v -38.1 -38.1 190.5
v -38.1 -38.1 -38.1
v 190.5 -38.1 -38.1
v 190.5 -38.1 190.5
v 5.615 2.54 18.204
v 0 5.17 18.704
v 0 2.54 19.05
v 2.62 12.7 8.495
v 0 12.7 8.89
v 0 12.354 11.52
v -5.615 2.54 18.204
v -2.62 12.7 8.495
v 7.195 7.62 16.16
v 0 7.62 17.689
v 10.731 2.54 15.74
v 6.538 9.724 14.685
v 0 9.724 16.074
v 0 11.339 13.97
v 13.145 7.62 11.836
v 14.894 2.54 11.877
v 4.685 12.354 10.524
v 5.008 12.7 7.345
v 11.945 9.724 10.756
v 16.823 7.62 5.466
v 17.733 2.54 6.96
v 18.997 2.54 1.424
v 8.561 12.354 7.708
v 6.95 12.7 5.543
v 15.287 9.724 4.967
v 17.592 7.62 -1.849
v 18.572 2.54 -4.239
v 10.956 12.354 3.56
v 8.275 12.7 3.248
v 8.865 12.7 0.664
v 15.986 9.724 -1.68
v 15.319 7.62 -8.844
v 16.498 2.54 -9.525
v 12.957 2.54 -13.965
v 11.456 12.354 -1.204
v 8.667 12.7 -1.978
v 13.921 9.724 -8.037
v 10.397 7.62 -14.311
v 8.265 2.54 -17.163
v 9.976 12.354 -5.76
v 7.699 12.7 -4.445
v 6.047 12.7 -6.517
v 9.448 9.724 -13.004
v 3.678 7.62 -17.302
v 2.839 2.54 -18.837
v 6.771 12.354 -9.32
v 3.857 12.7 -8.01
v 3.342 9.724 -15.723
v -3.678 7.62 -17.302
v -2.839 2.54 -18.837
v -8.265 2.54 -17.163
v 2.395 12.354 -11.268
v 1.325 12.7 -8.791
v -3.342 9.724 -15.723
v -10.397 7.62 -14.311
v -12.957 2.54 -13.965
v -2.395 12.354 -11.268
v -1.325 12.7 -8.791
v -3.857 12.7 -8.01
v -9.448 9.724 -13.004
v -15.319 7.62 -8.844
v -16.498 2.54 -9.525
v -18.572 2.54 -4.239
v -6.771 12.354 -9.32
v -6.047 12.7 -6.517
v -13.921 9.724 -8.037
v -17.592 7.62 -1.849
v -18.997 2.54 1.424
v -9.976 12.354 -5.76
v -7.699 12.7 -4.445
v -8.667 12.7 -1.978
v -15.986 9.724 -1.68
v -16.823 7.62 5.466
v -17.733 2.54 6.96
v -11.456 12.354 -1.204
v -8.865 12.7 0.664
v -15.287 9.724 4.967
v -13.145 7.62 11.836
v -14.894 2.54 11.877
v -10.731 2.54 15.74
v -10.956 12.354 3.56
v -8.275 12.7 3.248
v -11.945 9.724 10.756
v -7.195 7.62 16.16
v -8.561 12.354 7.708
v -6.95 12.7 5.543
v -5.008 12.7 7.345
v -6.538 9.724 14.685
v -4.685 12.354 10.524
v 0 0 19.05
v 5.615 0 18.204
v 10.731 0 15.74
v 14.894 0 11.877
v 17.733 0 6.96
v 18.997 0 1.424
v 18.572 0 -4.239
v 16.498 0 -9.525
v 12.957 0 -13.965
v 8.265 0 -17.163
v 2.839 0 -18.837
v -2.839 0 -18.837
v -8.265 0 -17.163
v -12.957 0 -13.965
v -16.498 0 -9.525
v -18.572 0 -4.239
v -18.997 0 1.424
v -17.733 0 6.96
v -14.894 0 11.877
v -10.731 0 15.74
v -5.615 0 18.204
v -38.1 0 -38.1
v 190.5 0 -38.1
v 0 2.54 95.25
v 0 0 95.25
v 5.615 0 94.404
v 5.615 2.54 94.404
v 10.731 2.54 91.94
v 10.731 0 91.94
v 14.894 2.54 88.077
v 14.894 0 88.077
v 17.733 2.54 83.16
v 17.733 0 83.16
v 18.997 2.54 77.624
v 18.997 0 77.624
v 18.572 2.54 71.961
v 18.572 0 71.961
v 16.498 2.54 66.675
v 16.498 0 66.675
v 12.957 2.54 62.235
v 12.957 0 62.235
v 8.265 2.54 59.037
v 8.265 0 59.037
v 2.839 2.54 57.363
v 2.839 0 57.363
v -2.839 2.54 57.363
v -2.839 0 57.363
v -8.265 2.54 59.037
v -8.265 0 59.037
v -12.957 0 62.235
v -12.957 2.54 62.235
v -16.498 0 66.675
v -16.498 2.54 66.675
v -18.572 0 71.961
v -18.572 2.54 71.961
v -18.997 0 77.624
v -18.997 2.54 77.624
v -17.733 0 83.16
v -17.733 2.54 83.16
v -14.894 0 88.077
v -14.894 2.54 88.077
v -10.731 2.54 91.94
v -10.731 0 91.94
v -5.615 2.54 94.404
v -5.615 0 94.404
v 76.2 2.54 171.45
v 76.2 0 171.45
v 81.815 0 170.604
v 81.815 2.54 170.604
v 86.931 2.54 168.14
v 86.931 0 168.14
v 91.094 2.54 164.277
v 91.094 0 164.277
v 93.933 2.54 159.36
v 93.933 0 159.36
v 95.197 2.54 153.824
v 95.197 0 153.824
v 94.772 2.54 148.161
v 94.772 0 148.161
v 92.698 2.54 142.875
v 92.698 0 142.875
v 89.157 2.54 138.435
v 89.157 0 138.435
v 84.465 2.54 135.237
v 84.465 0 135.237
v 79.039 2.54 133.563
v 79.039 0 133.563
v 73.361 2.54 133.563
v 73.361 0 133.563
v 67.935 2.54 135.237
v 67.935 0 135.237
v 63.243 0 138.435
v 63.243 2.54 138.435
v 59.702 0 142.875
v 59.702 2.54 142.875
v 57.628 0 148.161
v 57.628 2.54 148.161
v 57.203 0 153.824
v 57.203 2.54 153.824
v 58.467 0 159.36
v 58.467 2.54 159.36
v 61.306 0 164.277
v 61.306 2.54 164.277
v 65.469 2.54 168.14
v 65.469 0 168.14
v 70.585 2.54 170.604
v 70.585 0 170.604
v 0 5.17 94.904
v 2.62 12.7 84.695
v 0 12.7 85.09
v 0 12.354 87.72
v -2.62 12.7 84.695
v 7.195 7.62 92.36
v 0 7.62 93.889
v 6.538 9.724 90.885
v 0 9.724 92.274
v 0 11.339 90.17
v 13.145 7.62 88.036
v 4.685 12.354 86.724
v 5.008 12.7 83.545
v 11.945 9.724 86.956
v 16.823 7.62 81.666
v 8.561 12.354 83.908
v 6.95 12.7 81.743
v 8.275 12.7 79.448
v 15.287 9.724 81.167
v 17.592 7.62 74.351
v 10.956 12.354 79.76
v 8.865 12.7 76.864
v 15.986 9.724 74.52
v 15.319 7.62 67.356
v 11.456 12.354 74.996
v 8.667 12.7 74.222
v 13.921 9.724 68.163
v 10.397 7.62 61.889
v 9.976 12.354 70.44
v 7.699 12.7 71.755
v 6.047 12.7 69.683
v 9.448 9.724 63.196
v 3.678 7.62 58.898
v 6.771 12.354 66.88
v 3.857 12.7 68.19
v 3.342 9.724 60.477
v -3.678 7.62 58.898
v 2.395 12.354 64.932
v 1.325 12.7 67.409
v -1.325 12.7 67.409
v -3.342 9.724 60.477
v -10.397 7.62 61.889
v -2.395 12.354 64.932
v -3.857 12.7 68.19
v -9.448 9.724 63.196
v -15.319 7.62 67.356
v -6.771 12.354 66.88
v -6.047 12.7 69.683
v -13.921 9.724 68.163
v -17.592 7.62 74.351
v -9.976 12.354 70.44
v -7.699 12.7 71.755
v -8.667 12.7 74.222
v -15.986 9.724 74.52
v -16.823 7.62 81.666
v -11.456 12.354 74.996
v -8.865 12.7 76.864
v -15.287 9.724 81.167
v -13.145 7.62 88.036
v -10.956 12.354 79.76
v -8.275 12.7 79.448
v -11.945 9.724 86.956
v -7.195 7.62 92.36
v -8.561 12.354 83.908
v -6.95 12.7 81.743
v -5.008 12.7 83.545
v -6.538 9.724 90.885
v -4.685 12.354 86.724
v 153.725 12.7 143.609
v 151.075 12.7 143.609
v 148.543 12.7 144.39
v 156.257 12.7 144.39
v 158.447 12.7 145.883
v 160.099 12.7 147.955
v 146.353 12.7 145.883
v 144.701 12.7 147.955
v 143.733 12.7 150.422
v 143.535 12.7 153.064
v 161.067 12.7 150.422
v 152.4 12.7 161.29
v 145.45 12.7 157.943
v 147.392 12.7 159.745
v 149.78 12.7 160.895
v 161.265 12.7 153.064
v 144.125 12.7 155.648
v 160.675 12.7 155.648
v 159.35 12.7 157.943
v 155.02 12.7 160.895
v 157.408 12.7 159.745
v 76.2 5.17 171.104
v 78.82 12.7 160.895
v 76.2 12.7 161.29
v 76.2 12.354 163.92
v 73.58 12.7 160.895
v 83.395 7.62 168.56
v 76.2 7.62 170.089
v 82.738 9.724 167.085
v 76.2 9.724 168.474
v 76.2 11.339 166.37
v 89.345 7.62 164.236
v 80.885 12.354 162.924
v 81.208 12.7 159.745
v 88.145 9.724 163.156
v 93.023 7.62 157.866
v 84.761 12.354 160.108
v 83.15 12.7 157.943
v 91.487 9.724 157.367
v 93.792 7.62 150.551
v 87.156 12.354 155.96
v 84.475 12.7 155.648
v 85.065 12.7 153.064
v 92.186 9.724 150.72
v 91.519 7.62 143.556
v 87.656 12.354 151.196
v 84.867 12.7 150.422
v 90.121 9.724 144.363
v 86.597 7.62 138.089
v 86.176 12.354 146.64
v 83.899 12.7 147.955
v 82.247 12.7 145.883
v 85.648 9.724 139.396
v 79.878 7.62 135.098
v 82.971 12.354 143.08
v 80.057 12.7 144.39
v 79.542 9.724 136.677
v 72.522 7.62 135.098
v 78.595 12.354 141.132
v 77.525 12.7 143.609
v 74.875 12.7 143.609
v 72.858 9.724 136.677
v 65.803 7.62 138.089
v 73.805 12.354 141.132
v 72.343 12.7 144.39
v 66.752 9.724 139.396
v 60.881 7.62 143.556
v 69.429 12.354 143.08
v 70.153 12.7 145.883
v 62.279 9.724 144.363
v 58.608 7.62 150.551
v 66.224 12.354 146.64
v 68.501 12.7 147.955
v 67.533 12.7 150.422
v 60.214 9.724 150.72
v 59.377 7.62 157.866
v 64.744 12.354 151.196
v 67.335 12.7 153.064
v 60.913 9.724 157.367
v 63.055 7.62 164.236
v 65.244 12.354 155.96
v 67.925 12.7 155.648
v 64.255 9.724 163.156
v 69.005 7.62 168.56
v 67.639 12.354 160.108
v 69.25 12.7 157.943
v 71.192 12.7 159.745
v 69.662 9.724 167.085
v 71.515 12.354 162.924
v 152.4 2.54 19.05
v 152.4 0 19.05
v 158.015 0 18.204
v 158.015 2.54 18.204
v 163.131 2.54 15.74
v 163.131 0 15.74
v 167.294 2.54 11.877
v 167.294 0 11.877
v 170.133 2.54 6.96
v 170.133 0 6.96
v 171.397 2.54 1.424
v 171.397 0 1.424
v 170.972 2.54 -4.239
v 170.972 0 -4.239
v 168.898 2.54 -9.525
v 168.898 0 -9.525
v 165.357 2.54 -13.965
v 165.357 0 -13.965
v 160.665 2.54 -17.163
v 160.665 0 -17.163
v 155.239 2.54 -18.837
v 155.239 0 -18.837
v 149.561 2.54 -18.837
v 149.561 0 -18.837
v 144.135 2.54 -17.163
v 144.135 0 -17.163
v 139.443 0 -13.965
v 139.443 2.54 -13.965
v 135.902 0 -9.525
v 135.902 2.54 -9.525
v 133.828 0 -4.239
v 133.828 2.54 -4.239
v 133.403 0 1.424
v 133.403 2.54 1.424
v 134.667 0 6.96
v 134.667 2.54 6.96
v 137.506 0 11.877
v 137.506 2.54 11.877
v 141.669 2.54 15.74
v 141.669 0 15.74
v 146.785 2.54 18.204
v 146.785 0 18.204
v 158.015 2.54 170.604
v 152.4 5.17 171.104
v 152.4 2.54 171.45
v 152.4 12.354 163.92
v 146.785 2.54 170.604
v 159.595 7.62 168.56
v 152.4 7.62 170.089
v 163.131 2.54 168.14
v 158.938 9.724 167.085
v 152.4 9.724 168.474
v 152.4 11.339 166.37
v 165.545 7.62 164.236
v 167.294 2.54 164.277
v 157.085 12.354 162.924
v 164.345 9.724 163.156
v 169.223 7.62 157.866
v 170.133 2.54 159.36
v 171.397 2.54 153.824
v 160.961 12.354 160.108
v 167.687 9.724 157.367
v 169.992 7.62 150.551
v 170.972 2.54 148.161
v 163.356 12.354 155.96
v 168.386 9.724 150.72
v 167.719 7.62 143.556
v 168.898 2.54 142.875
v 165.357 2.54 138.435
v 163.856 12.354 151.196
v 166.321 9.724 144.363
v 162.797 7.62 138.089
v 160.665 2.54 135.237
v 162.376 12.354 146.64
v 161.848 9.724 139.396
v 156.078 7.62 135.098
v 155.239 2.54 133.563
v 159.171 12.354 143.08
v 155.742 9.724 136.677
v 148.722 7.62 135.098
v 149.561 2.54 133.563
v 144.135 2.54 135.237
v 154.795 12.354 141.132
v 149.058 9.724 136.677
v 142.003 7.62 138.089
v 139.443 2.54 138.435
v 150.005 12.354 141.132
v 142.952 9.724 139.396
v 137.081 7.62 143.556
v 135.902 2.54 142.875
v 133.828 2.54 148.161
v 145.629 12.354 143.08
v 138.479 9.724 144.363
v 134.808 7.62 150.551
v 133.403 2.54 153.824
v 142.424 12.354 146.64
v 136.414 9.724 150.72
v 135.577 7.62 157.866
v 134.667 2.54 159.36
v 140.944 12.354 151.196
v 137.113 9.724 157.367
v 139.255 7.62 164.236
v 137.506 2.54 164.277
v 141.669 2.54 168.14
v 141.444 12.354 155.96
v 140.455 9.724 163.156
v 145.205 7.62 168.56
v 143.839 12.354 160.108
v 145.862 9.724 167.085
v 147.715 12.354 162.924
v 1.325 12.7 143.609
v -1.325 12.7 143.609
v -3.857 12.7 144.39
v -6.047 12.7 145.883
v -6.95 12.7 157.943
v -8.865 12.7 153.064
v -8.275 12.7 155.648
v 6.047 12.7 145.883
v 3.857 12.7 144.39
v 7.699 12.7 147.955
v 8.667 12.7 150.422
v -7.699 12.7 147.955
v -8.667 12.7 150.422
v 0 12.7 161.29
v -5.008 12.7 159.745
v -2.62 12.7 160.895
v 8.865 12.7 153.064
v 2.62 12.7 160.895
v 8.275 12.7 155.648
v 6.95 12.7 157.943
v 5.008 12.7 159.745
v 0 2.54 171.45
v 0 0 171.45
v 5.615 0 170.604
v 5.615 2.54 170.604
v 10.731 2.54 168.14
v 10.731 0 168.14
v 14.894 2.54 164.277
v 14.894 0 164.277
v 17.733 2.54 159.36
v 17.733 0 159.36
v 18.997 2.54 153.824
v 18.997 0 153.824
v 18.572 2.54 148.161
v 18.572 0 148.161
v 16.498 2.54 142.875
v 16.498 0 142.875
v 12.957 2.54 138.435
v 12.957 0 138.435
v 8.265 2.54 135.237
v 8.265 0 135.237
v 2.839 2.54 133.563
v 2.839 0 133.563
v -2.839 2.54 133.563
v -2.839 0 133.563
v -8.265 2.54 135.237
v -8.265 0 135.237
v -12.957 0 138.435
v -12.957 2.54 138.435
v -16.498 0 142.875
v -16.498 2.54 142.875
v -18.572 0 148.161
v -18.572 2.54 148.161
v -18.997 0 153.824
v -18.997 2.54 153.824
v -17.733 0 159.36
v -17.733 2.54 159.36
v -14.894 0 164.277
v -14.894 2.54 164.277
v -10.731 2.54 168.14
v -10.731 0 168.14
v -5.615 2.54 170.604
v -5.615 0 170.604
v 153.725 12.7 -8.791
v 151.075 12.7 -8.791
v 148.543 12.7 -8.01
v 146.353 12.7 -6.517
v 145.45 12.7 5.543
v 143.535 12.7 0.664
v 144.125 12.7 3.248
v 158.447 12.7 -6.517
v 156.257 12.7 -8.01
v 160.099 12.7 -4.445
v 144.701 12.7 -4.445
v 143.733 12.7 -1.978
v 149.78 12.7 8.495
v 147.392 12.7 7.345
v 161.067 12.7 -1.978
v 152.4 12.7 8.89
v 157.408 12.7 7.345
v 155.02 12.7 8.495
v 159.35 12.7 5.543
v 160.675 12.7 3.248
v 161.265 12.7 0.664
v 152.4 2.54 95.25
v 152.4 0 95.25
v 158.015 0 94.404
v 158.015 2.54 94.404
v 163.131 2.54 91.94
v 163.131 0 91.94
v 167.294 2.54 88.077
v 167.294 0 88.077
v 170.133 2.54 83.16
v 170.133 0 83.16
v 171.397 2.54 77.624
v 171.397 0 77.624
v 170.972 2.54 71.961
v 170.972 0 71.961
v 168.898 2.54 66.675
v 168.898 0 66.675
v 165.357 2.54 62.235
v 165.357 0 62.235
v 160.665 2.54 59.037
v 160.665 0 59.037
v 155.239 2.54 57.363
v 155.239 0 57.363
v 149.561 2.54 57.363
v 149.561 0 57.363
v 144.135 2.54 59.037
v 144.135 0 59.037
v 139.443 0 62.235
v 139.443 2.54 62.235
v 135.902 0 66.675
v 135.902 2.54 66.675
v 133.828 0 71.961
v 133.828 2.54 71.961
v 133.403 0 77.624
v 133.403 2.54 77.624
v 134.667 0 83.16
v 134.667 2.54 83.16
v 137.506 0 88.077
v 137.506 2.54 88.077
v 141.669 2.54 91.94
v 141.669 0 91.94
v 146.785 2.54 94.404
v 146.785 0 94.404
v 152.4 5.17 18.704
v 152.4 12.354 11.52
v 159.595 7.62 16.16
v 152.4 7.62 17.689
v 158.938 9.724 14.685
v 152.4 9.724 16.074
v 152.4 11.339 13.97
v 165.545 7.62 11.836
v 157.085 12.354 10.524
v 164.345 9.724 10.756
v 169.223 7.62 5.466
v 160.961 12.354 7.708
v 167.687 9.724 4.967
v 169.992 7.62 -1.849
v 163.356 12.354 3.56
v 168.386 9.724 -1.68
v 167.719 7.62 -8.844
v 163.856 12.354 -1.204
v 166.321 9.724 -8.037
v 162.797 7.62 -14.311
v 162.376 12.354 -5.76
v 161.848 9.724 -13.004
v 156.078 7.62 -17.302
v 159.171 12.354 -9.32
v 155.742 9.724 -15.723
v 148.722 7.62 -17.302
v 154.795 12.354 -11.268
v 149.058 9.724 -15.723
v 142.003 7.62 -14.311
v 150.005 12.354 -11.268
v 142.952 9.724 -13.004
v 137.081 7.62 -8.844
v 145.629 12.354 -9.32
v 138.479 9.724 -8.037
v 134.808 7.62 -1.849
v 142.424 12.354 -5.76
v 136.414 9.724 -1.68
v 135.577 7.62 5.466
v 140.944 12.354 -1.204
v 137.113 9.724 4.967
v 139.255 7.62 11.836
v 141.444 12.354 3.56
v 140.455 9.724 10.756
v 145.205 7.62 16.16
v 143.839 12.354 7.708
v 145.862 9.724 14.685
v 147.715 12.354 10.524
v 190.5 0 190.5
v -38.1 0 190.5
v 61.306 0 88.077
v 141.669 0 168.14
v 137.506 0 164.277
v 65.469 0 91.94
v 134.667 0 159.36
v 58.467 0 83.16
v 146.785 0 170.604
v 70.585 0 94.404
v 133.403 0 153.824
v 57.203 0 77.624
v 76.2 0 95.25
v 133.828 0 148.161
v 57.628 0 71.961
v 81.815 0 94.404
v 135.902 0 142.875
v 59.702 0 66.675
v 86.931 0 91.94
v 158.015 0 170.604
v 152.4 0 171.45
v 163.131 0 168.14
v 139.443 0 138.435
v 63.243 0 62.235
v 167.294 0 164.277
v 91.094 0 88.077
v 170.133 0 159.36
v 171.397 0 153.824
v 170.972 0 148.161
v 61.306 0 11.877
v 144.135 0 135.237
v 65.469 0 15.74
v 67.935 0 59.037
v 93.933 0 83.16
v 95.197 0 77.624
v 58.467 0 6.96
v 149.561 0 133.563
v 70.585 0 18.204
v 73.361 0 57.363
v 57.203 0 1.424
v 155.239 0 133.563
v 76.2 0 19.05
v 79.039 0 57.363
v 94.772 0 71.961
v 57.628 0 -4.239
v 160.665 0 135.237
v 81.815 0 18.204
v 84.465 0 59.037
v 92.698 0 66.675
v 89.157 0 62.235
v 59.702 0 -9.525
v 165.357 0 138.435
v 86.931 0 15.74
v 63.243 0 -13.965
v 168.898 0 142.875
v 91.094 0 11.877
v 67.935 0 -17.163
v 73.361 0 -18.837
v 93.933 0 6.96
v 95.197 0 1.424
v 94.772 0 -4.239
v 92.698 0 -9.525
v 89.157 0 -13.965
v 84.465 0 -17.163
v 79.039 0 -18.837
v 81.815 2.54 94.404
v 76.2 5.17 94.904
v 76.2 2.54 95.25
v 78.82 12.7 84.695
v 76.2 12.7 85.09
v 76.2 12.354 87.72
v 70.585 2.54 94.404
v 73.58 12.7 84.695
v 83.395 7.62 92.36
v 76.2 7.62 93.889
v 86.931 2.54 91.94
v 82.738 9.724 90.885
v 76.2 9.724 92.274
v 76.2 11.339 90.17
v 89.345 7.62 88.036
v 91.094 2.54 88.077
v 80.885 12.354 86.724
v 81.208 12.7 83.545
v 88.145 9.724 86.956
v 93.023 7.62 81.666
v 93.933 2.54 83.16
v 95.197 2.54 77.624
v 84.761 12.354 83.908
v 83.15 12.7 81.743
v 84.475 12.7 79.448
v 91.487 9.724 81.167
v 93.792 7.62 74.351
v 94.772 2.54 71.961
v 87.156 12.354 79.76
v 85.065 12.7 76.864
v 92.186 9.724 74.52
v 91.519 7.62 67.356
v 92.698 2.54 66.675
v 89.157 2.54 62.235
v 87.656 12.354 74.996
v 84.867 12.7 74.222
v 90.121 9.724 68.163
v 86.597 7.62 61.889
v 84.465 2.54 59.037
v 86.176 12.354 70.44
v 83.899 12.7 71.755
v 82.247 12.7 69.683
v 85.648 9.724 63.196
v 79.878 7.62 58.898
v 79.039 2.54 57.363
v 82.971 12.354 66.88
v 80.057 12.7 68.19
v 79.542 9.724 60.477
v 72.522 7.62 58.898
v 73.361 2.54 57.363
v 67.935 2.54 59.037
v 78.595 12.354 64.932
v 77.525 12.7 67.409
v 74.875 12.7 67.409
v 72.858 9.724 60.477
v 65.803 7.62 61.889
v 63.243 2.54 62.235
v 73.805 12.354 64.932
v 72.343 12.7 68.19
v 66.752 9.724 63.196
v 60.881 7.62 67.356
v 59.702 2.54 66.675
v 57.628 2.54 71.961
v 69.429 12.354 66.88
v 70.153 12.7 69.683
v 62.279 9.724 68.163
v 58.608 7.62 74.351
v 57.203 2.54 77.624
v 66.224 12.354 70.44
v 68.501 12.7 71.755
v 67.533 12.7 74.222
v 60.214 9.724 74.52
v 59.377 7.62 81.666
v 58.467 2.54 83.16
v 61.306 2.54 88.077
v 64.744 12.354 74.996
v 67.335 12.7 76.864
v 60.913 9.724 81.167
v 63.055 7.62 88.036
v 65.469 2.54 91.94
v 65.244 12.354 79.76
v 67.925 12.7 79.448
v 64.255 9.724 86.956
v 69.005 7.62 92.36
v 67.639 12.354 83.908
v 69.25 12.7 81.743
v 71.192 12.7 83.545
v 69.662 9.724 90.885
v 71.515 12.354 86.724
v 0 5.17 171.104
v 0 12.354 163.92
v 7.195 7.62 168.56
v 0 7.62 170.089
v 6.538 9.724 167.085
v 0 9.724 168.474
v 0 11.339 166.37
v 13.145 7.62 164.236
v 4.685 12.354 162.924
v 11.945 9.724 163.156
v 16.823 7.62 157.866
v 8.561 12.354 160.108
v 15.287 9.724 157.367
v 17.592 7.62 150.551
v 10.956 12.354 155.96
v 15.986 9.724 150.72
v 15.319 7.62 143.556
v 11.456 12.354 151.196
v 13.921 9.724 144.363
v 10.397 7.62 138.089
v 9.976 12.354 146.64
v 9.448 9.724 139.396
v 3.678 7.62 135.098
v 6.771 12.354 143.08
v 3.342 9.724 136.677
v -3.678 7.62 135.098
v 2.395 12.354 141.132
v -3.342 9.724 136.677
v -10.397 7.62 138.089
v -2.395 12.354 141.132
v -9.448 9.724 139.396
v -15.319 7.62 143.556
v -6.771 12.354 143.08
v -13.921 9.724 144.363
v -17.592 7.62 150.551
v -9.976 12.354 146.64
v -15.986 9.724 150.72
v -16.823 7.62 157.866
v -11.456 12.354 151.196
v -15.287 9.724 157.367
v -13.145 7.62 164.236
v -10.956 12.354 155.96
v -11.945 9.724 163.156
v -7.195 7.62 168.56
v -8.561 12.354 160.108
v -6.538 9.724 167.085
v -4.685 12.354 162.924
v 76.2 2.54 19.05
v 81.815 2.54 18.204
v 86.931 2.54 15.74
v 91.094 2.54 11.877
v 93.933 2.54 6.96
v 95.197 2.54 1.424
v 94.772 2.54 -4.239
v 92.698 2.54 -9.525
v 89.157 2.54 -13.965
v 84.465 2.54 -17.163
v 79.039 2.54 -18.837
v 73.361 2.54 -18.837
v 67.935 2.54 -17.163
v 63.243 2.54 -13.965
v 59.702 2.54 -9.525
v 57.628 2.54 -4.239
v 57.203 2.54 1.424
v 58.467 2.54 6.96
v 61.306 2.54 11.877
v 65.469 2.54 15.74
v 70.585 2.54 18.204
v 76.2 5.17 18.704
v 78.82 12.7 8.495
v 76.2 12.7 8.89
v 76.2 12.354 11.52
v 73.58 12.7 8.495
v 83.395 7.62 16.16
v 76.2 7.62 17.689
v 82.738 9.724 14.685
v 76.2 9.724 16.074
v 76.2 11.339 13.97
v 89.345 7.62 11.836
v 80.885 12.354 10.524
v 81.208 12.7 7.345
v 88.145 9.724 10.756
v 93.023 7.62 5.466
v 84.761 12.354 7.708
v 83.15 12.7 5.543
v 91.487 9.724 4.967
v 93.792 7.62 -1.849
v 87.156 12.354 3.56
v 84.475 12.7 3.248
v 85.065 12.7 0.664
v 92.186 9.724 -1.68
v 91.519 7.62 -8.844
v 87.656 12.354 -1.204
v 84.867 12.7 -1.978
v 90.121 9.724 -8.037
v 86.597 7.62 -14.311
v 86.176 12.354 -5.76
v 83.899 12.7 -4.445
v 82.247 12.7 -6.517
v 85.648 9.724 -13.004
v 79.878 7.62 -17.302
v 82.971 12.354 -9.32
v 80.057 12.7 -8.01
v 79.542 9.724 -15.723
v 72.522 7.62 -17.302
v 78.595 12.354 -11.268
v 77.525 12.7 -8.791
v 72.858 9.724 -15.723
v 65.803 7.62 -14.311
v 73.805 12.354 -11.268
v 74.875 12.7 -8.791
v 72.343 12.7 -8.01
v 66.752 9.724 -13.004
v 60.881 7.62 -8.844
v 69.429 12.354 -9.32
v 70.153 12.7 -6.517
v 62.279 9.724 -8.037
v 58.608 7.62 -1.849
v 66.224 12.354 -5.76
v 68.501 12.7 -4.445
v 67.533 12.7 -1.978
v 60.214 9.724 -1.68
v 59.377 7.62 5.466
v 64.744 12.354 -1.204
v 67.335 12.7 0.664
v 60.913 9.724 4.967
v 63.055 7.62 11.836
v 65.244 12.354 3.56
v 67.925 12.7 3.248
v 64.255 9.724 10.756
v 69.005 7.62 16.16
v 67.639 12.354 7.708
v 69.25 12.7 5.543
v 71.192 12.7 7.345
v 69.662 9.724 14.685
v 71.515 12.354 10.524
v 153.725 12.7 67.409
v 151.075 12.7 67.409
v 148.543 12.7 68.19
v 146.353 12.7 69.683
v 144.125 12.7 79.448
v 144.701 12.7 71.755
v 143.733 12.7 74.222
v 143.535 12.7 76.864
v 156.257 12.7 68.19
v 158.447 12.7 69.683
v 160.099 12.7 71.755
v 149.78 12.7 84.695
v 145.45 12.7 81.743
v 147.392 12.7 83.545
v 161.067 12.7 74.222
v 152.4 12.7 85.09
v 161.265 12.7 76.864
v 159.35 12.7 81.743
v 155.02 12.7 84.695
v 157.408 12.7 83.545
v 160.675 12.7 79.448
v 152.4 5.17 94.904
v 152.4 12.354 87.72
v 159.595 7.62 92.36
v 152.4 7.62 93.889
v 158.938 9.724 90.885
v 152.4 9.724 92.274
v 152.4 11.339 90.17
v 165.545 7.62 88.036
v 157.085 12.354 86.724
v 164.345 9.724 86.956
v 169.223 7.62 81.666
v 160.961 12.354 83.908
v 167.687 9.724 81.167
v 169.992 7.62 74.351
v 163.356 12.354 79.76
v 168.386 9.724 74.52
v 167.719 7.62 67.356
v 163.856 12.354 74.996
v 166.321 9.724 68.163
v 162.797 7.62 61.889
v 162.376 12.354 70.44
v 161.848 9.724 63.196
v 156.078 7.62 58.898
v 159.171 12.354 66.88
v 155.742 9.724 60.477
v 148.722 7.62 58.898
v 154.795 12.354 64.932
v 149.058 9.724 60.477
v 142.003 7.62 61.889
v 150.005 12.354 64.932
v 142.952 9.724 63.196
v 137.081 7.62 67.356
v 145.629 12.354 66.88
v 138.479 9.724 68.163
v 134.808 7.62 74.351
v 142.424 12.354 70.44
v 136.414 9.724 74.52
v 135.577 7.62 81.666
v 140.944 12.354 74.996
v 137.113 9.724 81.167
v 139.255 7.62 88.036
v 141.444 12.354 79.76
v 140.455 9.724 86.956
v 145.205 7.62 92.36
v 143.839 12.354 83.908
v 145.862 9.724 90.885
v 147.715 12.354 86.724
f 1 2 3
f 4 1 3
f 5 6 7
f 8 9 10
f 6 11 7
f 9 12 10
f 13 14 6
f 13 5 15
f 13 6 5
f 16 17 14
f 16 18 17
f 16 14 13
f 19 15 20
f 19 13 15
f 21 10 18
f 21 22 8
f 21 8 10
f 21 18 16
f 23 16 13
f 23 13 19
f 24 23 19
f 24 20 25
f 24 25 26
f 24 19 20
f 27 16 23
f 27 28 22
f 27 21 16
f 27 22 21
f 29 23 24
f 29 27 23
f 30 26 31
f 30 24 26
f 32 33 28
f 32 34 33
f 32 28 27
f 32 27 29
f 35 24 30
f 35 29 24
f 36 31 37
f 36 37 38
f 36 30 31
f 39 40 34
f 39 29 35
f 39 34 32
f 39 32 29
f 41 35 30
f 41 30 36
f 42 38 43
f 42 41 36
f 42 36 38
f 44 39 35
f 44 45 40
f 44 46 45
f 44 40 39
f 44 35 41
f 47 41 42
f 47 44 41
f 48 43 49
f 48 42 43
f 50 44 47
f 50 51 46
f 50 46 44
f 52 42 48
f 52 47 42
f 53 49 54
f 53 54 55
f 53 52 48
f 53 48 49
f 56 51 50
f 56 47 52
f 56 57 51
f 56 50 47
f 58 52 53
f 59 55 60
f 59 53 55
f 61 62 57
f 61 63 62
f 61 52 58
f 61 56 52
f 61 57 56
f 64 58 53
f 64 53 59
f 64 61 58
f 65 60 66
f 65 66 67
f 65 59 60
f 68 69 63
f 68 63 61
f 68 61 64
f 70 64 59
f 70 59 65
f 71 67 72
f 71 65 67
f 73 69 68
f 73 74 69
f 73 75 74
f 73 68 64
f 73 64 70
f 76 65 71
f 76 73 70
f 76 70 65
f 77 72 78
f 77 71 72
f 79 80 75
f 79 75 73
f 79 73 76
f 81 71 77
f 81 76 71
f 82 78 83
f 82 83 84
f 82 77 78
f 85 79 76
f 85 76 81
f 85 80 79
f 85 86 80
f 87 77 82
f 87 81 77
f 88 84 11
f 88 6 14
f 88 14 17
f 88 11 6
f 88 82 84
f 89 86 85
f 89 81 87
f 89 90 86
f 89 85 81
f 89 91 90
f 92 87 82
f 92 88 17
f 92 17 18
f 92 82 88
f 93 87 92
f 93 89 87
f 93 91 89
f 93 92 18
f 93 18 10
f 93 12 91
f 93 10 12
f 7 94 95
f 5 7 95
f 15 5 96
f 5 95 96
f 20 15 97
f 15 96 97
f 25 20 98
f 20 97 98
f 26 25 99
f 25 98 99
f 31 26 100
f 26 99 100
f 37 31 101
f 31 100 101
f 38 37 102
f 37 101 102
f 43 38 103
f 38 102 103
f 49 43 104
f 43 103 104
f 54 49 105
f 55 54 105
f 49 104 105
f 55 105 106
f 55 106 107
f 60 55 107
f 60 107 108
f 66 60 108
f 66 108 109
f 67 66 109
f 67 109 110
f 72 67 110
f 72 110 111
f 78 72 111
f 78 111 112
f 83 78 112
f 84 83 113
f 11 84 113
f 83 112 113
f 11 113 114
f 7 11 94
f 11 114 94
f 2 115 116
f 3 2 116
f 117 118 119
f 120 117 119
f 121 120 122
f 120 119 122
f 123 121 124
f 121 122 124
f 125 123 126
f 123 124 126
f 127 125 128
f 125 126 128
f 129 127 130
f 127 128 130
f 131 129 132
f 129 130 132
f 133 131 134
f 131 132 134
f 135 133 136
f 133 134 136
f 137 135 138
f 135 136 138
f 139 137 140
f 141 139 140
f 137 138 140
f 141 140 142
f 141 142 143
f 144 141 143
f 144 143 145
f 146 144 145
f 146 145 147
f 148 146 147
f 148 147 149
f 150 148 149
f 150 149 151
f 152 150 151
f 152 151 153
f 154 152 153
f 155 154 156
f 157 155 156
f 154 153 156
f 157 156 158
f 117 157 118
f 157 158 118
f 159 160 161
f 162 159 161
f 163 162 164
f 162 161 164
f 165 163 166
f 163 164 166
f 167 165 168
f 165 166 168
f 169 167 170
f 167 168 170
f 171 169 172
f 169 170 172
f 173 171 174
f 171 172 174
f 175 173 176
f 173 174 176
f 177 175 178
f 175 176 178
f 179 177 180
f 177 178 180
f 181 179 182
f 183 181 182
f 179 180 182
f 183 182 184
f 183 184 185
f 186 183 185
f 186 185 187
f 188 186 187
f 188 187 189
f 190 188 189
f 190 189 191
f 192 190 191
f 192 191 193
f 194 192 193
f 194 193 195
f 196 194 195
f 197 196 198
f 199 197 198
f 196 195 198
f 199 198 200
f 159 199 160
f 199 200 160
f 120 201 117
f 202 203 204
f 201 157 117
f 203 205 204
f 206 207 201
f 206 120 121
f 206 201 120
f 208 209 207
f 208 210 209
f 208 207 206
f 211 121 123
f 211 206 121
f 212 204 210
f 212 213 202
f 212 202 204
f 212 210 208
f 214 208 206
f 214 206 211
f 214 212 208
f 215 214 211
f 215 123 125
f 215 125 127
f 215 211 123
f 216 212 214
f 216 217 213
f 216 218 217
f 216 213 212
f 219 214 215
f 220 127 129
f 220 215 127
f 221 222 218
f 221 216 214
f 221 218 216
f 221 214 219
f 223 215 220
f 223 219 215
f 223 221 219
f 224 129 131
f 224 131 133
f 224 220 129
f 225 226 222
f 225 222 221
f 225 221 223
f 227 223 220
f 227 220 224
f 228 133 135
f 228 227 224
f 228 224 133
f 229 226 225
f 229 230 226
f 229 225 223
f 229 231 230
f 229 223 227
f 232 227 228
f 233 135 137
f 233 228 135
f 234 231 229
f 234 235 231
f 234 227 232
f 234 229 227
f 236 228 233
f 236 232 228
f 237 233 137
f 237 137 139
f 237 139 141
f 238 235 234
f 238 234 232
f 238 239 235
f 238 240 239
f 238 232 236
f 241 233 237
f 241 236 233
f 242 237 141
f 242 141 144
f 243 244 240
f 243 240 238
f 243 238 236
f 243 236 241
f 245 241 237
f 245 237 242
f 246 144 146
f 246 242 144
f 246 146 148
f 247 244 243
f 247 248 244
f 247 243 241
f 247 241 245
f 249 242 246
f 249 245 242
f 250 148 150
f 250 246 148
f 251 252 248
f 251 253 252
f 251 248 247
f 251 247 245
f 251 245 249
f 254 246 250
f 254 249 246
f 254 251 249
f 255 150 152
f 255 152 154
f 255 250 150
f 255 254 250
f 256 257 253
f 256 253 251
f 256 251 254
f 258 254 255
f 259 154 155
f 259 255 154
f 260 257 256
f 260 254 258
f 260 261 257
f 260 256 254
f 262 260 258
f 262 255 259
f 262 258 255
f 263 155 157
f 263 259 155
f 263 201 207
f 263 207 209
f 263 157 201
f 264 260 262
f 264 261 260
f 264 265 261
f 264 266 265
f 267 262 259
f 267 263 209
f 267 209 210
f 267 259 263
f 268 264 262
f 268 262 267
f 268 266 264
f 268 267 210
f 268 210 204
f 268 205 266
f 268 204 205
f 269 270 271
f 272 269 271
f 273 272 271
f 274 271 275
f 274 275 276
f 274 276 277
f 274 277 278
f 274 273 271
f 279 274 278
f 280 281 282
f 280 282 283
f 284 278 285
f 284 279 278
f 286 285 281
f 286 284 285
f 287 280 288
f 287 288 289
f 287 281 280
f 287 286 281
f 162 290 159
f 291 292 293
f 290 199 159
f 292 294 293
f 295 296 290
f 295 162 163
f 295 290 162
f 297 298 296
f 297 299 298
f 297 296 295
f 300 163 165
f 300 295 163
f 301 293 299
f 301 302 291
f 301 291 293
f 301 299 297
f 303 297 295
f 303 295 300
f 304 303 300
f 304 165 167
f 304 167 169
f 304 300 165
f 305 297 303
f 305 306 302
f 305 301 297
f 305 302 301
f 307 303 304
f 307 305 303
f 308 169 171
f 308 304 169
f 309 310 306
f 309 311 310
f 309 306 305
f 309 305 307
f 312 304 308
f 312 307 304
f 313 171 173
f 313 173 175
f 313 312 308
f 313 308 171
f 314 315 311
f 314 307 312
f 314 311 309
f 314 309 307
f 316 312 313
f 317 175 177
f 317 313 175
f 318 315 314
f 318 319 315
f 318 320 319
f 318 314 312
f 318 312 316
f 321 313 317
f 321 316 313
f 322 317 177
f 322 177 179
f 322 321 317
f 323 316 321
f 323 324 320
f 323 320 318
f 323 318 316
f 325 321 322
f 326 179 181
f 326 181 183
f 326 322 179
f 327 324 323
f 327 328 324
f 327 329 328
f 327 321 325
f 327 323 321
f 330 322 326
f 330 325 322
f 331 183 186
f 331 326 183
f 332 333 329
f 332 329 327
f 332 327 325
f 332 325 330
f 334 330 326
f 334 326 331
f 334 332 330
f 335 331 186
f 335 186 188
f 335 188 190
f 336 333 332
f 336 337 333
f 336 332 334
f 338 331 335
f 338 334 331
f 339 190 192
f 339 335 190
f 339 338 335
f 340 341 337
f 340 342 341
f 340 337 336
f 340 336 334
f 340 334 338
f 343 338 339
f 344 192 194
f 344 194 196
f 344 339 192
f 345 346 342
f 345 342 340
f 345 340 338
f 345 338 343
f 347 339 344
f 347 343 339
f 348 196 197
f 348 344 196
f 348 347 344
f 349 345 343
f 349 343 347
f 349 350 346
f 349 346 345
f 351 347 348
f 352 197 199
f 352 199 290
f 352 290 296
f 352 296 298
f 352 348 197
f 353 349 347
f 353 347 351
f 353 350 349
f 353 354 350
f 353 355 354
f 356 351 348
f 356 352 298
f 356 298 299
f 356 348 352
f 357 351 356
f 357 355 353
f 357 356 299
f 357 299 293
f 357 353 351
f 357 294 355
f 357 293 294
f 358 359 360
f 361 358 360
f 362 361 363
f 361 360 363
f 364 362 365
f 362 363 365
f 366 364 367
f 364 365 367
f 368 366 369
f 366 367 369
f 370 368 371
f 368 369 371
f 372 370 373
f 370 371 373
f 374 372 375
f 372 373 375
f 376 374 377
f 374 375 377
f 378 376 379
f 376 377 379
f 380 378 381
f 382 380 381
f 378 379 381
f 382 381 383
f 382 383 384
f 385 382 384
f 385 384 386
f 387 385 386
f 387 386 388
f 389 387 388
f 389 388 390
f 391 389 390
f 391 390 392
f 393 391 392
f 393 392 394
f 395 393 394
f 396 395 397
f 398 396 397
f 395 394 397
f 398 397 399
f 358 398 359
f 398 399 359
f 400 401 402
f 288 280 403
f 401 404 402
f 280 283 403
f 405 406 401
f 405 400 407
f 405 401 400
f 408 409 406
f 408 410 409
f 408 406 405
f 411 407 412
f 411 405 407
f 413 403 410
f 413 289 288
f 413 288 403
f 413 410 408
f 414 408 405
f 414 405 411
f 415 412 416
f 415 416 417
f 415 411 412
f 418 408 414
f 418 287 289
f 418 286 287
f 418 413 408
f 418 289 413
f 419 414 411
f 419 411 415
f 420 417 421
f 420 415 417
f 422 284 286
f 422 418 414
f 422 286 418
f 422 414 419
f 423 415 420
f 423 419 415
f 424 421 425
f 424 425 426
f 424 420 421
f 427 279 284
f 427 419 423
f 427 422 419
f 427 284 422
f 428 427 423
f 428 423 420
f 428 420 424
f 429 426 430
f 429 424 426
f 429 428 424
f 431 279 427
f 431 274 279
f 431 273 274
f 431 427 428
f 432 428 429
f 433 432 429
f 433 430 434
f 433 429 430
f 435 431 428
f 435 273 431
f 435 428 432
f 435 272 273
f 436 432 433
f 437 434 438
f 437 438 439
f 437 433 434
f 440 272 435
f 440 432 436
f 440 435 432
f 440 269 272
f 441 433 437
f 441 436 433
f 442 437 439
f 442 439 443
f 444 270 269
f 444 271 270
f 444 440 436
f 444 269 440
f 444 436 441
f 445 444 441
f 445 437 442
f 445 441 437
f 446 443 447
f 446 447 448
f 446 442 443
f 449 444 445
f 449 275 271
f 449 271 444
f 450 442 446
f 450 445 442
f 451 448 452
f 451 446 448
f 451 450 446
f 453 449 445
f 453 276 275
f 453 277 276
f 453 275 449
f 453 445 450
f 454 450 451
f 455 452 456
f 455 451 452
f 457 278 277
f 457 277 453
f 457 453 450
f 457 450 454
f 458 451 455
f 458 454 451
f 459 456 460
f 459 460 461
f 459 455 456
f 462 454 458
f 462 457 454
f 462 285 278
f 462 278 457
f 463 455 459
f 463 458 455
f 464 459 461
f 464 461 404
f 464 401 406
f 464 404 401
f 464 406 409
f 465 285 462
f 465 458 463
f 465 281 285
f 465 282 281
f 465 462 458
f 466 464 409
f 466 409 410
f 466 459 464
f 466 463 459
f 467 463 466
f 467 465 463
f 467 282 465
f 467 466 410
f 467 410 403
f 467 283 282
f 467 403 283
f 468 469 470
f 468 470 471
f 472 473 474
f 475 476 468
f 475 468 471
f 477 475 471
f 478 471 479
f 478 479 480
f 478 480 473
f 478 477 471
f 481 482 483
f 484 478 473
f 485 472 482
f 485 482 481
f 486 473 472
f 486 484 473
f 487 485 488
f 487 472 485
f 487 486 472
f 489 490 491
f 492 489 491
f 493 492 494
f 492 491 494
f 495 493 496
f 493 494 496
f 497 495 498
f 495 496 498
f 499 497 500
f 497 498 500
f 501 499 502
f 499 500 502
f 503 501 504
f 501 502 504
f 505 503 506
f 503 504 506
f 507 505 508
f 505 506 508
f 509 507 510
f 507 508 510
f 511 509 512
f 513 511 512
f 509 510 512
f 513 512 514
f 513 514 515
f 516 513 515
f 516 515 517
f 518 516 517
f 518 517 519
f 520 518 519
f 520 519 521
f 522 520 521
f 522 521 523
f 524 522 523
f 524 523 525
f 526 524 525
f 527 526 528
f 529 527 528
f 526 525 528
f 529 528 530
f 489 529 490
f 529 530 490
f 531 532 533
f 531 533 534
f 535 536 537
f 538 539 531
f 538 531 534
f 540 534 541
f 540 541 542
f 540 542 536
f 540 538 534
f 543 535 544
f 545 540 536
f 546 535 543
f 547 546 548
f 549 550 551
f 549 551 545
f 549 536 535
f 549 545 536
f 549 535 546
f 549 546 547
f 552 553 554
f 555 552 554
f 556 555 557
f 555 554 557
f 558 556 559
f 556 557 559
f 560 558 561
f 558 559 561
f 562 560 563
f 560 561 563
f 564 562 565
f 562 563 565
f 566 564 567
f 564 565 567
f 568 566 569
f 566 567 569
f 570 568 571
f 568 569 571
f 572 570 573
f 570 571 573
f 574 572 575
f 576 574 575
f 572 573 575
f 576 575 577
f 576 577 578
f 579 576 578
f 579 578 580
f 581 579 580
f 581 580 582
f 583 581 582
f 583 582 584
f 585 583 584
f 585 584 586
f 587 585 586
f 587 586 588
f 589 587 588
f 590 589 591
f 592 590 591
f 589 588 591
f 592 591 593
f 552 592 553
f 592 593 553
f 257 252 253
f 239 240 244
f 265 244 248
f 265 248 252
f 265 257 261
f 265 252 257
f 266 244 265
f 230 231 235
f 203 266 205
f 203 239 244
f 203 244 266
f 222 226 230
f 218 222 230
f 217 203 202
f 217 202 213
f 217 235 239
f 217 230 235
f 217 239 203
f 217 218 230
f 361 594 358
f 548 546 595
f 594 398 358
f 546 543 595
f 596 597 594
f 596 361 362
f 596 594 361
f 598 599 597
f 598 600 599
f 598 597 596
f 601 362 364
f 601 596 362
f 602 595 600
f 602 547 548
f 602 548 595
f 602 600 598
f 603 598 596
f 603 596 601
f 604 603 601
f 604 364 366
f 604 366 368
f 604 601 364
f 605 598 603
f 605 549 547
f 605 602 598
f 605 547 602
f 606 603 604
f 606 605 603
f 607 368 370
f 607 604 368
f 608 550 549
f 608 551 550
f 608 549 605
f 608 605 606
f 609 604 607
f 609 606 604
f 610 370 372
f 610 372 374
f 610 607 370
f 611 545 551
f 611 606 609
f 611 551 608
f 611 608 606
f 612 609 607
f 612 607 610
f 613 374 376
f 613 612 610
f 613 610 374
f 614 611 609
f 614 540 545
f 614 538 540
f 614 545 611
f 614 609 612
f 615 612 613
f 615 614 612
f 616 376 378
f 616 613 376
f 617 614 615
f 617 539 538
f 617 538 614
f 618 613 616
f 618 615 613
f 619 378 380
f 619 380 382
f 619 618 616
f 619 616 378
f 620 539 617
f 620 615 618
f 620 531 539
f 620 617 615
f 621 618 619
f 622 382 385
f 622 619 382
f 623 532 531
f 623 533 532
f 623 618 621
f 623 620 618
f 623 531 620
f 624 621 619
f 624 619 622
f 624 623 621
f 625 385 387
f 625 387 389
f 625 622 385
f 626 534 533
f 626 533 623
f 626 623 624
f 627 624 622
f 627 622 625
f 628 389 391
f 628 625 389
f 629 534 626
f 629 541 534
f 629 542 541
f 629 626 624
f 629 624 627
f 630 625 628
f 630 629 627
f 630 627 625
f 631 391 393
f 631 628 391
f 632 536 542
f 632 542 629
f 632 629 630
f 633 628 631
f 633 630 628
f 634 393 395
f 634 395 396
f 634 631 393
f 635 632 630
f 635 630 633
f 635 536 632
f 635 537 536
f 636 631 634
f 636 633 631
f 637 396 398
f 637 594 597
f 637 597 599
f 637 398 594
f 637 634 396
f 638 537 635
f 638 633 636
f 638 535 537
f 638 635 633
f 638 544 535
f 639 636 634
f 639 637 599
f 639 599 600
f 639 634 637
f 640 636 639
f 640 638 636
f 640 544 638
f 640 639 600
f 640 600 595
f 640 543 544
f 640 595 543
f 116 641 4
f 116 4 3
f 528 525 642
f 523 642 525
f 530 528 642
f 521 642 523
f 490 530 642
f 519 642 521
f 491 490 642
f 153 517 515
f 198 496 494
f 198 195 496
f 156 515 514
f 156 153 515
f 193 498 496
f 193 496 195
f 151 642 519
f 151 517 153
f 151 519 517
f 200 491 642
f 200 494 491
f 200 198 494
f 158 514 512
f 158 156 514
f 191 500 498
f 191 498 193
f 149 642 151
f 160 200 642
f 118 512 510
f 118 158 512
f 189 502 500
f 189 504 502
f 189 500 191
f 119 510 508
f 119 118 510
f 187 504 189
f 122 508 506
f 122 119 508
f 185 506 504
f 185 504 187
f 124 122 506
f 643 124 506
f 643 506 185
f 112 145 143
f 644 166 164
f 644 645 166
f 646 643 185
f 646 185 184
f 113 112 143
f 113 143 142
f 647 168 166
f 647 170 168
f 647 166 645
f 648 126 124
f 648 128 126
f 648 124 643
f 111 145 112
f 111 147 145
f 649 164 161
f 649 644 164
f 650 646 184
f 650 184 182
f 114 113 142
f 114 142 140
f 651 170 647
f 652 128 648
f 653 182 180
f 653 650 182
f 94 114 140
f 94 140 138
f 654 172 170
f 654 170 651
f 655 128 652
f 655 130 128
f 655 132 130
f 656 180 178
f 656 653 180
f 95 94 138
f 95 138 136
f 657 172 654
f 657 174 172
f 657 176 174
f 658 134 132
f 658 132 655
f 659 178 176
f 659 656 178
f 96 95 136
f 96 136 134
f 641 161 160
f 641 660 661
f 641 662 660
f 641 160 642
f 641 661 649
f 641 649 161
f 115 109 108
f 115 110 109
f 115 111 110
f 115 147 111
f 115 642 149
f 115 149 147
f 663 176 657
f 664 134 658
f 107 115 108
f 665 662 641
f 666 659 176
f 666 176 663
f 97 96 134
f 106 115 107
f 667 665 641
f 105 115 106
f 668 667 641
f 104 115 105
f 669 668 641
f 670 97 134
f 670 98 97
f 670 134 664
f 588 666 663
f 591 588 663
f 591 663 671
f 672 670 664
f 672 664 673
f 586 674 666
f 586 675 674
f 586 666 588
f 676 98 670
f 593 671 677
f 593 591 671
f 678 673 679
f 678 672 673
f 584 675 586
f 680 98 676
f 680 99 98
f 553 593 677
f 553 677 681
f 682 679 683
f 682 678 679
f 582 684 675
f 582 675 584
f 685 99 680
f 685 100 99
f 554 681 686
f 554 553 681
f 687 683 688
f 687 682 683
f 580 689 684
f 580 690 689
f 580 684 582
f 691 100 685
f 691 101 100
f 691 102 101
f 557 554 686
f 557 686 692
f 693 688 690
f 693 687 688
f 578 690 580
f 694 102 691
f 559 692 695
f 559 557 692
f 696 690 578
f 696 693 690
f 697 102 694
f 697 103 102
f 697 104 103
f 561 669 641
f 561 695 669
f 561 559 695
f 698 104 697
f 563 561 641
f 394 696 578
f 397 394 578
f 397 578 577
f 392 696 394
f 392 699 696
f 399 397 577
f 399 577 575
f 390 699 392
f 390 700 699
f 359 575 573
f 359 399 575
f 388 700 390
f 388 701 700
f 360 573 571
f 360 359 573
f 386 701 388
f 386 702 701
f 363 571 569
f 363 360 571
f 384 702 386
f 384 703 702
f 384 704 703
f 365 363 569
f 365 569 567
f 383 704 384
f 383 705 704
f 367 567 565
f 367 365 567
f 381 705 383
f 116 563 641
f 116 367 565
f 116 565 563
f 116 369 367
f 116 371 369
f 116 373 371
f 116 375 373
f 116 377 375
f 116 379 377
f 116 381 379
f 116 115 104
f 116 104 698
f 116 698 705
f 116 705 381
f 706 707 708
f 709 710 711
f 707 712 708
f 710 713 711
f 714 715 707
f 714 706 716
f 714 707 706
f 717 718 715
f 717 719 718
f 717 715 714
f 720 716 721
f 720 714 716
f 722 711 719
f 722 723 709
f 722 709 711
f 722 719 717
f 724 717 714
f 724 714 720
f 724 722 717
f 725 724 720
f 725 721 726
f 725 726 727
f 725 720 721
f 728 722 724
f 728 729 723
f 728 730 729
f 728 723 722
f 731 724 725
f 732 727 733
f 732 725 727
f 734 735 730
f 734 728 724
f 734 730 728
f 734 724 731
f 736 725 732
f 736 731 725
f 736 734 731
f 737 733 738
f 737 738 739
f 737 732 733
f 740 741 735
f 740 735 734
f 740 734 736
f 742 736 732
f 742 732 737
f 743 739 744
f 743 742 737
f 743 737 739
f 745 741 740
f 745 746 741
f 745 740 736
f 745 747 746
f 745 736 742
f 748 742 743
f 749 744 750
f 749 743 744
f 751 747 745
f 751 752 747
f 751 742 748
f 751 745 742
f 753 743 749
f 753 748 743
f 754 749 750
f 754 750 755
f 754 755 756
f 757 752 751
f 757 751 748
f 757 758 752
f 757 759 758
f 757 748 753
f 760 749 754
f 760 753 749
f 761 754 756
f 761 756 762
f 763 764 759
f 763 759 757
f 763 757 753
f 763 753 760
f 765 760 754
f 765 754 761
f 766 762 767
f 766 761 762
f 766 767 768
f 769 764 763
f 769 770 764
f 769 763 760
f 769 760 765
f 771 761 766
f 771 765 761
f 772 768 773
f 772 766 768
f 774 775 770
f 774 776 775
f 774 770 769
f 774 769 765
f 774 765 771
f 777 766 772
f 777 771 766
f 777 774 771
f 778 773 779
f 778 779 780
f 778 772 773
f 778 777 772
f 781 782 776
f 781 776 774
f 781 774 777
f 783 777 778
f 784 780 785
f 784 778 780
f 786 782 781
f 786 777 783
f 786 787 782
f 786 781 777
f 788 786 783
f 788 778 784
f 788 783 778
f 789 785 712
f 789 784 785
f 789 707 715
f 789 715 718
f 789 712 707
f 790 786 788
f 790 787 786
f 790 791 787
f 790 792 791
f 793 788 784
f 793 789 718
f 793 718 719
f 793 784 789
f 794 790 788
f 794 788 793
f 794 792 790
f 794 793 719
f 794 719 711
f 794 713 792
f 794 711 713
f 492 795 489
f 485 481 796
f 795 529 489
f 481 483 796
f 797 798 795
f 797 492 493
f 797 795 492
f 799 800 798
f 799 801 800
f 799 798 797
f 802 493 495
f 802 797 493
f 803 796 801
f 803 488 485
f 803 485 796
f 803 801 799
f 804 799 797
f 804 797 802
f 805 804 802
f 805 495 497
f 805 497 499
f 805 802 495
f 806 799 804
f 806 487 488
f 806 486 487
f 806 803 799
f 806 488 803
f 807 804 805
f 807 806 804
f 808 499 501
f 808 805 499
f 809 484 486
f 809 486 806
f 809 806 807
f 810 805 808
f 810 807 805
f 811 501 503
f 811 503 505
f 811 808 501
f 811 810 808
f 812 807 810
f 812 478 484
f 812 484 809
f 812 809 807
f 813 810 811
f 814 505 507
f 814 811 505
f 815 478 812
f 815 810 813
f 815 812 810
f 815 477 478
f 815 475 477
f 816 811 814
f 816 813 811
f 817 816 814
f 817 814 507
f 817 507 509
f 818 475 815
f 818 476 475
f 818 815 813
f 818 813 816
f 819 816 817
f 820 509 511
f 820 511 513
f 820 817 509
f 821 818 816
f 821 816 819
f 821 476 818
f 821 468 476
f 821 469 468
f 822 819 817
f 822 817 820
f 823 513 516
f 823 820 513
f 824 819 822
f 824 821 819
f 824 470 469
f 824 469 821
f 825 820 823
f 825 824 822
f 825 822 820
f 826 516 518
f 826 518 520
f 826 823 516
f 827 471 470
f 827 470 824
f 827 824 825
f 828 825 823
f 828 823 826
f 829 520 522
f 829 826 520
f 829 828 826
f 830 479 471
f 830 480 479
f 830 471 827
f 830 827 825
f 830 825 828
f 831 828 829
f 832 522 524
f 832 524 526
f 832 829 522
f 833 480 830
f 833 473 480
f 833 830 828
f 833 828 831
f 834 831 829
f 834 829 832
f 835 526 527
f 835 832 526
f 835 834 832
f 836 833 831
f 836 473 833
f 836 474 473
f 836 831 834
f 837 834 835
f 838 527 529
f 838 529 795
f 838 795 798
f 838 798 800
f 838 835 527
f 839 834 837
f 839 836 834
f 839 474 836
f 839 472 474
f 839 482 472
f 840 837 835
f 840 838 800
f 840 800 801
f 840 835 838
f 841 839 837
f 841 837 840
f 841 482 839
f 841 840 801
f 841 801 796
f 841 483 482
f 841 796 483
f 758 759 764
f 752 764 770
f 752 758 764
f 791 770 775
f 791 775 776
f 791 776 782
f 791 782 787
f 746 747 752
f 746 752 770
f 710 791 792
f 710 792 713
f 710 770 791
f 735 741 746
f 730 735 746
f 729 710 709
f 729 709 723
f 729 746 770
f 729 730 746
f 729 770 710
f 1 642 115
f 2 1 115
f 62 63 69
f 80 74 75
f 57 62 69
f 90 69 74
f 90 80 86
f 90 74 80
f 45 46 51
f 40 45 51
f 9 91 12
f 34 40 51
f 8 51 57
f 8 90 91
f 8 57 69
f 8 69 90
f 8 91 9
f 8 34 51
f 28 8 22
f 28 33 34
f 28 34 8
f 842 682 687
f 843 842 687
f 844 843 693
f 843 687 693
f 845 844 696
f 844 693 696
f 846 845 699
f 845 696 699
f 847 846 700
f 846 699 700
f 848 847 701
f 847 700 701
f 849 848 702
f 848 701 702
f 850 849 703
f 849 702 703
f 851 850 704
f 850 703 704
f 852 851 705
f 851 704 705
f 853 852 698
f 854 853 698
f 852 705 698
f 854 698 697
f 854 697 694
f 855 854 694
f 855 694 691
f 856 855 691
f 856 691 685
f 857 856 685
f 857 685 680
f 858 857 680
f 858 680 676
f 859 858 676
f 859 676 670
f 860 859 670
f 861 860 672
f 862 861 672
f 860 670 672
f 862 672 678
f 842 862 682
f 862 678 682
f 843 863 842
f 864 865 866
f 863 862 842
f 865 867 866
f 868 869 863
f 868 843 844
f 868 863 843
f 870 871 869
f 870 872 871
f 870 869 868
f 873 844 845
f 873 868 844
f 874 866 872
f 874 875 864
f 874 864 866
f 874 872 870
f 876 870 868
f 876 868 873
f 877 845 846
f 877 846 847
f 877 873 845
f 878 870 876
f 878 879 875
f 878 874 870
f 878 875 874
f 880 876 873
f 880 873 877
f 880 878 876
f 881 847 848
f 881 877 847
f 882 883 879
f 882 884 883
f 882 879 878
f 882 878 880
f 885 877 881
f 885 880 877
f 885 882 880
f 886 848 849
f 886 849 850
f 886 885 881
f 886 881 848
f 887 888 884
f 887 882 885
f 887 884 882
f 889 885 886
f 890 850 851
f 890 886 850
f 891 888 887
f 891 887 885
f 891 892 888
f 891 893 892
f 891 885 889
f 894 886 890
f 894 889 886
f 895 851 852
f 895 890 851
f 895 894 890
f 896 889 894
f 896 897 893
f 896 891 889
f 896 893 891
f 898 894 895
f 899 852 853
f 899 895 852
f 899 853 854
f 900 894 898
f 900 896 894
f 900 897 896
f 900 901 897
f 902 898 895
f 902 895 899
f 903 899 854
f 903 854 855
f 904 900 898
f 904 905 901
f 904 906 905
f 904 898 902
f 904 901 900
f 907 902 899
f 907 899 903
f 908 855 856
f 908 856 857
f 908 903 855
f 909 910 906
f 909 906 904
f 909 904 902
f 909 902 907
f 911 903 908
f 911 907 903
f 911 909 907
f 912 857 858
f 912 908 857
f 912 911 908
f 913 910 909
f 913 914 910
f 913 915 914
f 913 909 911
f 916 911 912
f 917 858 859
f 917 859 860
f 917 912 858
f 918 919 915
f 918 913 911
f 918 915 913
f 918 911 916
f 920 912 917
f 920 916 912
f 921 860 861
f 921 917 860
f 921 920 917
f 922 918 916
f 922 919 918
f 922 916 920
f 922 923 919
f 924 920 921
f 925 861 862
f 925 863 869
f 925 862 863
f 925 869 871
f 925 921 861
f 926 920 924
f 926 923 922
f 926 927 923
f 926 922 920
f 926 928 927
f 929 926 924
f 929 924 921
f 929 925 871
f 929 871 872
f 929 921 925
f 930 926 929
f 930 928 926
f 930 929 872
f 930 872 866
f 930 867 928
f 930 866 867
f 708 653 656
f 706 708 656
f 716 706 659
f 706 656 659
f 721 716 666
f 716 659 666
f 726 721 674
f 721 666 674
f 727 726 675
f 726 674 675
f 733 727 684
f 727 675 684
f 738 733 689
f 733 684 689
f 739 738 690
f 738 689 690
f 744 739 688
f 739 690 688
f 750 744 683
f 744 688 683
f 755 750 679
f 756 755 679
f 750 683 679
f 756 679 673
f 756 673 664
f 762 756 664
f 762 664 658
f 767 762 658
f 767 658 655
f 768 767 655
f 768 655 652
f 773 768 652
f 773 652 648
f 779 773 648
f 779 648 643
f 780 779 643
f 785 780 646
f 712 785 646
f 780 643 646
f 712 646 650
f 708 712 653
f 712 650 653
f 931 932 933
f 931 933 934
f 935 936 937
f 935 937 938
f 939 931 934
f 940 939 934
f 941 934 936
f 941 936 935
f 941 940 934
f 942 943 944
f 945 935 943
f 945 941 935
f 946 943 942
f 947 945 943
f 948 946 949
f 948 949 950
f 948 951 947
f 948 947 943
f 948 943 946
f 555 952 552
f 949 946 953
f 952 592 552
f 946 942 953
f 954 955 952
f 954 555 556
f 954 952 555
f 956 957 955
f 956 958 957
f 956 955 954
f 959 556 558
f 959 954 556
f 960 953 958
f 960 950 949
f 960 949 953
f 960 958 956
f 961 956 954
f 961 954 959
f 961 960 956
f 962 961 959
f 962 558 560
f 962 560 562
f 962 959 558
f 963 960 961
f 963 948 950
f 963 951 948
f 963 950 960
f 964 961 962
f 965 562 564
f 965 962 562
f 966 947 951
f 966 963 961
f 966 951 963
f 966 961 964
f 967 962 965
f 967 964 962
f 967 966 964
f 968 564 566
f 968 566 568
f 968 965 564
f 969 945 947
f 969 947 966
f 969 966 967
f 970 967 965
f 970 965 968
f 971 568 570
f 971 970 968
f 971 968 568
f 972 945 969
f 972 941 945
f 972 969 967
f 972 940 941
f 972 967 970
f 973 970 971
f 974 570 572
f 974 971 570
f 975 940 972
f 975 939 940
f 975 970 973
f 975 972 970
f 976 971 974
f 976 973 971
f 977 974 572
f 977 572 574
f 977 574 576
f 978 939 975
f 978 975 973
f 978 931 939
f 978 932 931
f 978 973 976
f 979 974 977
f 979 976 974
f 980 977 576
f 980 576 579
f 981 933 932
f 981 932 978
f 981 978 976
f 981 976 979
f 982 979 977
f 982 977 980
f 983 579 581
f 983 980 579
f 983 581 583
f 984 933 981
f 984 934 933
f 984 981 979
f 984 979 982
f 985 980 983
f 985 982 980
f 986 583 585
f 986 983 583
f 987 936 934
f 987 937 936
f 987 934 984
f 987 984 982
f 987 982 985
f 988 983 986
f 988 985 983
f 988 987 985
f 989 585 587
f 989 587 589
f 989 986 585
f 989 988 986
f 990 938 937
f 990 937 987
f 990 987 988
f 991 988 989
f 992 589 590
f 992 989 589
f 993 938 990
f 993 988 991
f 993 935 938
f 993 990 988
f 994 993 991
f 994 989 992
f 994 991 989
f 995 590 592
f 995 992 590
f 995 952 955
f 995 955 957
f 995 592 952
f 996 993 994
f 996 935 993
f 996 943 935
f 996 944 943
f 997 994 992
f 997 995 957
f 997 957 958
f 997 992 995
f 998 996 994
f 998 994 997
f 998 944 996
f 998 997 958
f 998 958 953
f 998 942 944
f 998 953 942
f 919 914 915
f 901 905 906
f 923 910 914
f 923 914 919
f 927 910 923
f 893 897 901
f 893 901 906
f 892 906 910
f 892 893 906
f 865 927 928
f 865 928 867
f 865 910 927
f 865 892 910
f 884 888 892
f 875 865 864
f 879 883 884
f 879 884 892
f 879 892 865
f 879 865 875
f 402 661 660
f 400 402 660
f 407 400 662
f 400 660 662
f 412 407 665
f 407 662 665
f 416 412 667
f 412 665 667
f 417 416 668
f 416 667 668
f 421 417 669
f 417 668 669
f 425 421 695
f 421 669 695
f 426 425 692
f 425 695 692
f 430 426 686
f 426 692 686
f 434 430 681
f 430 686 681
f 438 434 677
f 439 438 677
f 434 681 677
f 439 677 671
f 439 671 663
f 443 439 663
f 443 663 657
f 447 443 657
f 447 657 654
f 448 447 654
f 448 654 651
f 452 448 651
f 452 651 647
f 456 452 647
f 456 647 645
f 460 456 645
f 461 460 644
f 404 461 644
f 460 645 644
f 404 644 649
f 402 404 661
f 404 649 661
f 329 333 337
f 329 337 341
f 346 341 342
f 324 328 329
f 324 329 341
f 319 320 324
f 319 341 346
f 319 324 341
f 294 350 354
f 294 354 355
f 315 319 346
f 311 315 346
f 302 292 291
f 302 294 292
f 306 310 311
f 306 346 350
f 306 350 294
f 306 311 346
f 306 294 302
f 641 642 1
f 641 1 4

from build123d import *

# Parameters (mm, degrees)
SKETCH1_W           = 228.6
SKETCH1_H           = 228.6
BOSS_EXTRUDE1_DEPTH = 38.1
SKETCH1_3_R         = 19.05
BOSS_EXTRUDE2_DEPTH = 12.7
FILLET1_R           = 10.16


with BuildPart() as part:
    # Sketch1 → Boss-Extrude1 (new body)
    with BuildSketch(Plane(origin=(0, 0, 0), x_dir=(1, 0, 0), z_dir=(0, 1, 0))):
        with Locations((76.2, -76.2)):
            Rectangle(SKETCH1_W, SKETCH1_H)
    extrude(amount=-BOSS_EXTRUDE1_DEPTH)

    # Sketch1<3> → Boss-Extrude2 (add)
    with BuildSketch(Plane(origin=(0, 0, 0), x_dir=(1, 0, 0), z_dir=(0, 1, 0))):
        Circle(SKETCH1_3_R)
        with Locations((76.2, 0)):
            Circle(SKETCH1_3_R)
        with Locations((152.4, 0)):
            Circle(SKETCH1_3_R)
        with Locations((0, -76.2)):
            Circle(SKETCH1_3_R)
        with Locations((76.2, -76.2)):
            Circle(SKETCH1_3_R)
        with Locations((152.4, -76.2)):
            Circle(SKETCH1_3_R)
        with Locations((0, -152.4)):
            Circle(SKETCH1_3_R)
        with Locations((76.2, -152.4)):
            Circle(SKETCH1_3_R)
        with Locations((152.4, -152.4)):
            Circle(SKETCH1_3_R)
    extrude(amount=BOSS_EXTRUDE2_DEPTH)

    # Fillet1
    fillet1_edges = [part.edges().sort_by_distance(p)[0] for p in [
        (133.35, 12.7, 0),
        (133.35, 12.7, 76.2),
        (133.35, 12.7, 152.4),
        (57.15, 12.7, 152.4),
        (57.15, 12.7, 76.2),
        (57.15, 12.7, 0),
        (-19.05, 12.7, 0),
        (-19.05, 12.7, 76.2),
        (-19.05, 12.7, 152.4),
    ]]
    fillet(fillet1_edges, radius=FILLET1_R)


solid = part.part
